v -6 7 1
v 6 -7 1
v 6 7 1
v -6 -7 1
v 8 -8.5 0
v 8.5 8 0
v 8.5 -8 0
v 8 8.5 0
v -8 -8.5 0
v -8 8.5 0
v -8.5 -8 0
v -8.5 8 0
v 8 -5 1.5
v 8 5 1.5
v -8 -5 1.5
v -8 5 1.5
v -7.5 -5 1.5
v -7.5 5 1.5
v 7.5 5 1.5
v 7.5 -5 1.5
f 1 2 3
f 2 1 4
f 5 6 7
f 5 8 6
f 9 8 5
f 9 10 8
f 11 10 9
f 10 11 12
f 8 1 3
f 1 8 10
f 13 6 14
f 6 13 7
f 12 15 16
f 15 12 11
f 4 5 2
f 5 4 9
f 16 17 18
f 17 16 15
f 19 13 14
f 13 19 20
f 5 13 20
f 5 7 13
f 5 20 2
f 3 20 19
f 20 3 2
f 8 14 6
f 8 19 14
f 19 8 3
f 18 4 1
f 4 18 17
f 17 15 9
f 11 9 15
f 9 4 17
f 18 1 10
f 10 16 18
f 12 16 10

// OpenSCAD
// !!! Enable "Thrown Together" view, to see inner sides in purple colour

points = [
    // Concave
    [-6,   7,    1], // concaveFarLeft=0
    [ 6,   7,    1], // concaveFarRight=1
    [-6,  -7,    1], // concaveNearLeft=2
    [ 6,  -7,    1], // concaveNearRight=3
    
    // Bottom
    [-8.5,   8,    0], // bottomFarLeftNear=4
    [-8,     8.5,  0], // bottomFarLeftFar=5
    [ 8,     8.5,  0], // bottomFarRightFar=6
    [ 8.5,   8,    0], // bottomFarRightNear=7
    [ 8.5,  -8,    0], // bottomNearRightFar=8
    [ 8,    -8.5,  0], // bottomNearRightNear=9
    [-8,    -8.5,  0], // bottomNearLeftNear=10
    [-8.5,  -8,    0], // bottomNearLeftFar=11
    
    // Left Side
    [-8, 5,  1.5], // sideFarLeftTop=12
    [-8, -5, 1.5], // sideNearLeftTop=13
    
    // Right Side
    [8,  5, 1.5], // sideFarRightTop=14
    [8, -5, 1.5], // sideNearRightTop=15
    
    // Left Top Edge
    [-7.5, 5,  1.5], // leftTopEdgeFar=16
    [-7.5, -5, 1.5], // leftTopEdgeNear=17
    
    // Right Top Edge
    [7.5, 5,  1.5], // rightTopEdgeFar=18
    [7.5, -5, 1.5], // rightTopEdgeNear=19
];

concaveFarLeft = 0;
concaveFarRight = 1;
concaveNearLeft = 2;
concaveNearRight = 3;

bottomFarLeftNear=4;
bottomFarLeftFar=5;
bottomFarRightFar=6;
bottomFarRightNear=7;
bottomNearRightFar=8;
bottomNearRightNear=9;
bottomNearLeftNear=10;
bottomNearLeftFar=11;

sideFarLeftTop=12;
sideNearLeftTop=13;
    
sideFarRightTop=14;
sideNearRightTop=15;

leftTopEdgeFar=16;
leftTopEdgeNear=17;

rightTopEdgeFar=18;
rightTopEdgeNear=19;

faces = [
    [concaveFarLeft, concaveFarRight, concaveNearRight, concaveNearLeft], // Concave plate
    [bottomFarRightNear, bottomFarRightFar, bottomFarLeftFar, bottomFarLeftNear, bottomNearLeftFar, bottomNearLeftNear, bottomNearRightNear, bottomNearRightFar], // Bottom plate 
    [bottomFarRightFar, concaveFarRight, concaveFarLeft, bottomFarLeftFar], // Rear plate 
    [sideNearRightTop, sideFarRightTop, bottomFarRightNear, bottomNearRightFar], // Right plate 
    [sideFarLeftTop, sideNearLeftTop, bottomNearLeftFar, bottomFarLeftNear], // Left plate
    [bottomNearLeftNear, concaveNearLeft, concaveNearRight, bottomNearRightNear], // Front plate
    [sideFarLeftTop, leftTopEdgeFar, leftTopEdgeNear, sideNearLeftTop], // Left Top Edge
    [rightTopEdgeFar, sideFarRightTop, sideNearRightTop, rightTopEdgeNear], // Right Top Edge
    [rightTopEdgeNear, sideNearRightTop, bottomNearRightNear], // Right Near Edge 1
    [sideNearRightTop, bottomNearRightFar, bottomNearRightNear], // Right Near Edge 2
    [concaveNearRight, rightTopEdgeNear, bottomNearRightNear], // Right Near Edge 3
    [concaveFarRight, rightTopEdgeFar, rightTopEdgeNear, concaveNearRight], // Right concave to edge
    [bottomFarRightNear, sideFarRightTop, bottomFarRightFar], //Right Far Edge 1
    [sideFarRightTop, rightTopEdgeFar, bottomFarRightFar], //Right Far Edge 2
    [concaveFarRight, bottomFarRightFar, rightTopEdgeFar], // Right Far Edge 3
    [concaveNearLeft, leftTopEdgeNear, leftTopEdgeFar, concaveFarLeft], // left concave to edge
    [bottomNearLeftNear, sideNearLeftTop, leftTopEdgeNear], // Left Near Edge 1
    [sideNearLeftTop, bottomNearLeftNear, bottomNearLeftFar], // Left far edge 2
    [leftTopEdgeNear, concaveNearLeft, bottomNearLeftNear], // Left far edge 3
    [bottomFarLeftFar, concaveFarLeft, leftTopEdgeFar], // Left Far Edge 1
    [leftTopEdgeFar, sideFarLeftTop, bottomFarLeftFar], // Left Far Edge 2
    [bottomFarLeftFar, sideFarLeftTop, bottomFarLeftNear] // Left Far Edge 3
    
];

difference() {
    polyhedron( points, faces);
    // cylinder(d=5, h=5, center=true);
}
